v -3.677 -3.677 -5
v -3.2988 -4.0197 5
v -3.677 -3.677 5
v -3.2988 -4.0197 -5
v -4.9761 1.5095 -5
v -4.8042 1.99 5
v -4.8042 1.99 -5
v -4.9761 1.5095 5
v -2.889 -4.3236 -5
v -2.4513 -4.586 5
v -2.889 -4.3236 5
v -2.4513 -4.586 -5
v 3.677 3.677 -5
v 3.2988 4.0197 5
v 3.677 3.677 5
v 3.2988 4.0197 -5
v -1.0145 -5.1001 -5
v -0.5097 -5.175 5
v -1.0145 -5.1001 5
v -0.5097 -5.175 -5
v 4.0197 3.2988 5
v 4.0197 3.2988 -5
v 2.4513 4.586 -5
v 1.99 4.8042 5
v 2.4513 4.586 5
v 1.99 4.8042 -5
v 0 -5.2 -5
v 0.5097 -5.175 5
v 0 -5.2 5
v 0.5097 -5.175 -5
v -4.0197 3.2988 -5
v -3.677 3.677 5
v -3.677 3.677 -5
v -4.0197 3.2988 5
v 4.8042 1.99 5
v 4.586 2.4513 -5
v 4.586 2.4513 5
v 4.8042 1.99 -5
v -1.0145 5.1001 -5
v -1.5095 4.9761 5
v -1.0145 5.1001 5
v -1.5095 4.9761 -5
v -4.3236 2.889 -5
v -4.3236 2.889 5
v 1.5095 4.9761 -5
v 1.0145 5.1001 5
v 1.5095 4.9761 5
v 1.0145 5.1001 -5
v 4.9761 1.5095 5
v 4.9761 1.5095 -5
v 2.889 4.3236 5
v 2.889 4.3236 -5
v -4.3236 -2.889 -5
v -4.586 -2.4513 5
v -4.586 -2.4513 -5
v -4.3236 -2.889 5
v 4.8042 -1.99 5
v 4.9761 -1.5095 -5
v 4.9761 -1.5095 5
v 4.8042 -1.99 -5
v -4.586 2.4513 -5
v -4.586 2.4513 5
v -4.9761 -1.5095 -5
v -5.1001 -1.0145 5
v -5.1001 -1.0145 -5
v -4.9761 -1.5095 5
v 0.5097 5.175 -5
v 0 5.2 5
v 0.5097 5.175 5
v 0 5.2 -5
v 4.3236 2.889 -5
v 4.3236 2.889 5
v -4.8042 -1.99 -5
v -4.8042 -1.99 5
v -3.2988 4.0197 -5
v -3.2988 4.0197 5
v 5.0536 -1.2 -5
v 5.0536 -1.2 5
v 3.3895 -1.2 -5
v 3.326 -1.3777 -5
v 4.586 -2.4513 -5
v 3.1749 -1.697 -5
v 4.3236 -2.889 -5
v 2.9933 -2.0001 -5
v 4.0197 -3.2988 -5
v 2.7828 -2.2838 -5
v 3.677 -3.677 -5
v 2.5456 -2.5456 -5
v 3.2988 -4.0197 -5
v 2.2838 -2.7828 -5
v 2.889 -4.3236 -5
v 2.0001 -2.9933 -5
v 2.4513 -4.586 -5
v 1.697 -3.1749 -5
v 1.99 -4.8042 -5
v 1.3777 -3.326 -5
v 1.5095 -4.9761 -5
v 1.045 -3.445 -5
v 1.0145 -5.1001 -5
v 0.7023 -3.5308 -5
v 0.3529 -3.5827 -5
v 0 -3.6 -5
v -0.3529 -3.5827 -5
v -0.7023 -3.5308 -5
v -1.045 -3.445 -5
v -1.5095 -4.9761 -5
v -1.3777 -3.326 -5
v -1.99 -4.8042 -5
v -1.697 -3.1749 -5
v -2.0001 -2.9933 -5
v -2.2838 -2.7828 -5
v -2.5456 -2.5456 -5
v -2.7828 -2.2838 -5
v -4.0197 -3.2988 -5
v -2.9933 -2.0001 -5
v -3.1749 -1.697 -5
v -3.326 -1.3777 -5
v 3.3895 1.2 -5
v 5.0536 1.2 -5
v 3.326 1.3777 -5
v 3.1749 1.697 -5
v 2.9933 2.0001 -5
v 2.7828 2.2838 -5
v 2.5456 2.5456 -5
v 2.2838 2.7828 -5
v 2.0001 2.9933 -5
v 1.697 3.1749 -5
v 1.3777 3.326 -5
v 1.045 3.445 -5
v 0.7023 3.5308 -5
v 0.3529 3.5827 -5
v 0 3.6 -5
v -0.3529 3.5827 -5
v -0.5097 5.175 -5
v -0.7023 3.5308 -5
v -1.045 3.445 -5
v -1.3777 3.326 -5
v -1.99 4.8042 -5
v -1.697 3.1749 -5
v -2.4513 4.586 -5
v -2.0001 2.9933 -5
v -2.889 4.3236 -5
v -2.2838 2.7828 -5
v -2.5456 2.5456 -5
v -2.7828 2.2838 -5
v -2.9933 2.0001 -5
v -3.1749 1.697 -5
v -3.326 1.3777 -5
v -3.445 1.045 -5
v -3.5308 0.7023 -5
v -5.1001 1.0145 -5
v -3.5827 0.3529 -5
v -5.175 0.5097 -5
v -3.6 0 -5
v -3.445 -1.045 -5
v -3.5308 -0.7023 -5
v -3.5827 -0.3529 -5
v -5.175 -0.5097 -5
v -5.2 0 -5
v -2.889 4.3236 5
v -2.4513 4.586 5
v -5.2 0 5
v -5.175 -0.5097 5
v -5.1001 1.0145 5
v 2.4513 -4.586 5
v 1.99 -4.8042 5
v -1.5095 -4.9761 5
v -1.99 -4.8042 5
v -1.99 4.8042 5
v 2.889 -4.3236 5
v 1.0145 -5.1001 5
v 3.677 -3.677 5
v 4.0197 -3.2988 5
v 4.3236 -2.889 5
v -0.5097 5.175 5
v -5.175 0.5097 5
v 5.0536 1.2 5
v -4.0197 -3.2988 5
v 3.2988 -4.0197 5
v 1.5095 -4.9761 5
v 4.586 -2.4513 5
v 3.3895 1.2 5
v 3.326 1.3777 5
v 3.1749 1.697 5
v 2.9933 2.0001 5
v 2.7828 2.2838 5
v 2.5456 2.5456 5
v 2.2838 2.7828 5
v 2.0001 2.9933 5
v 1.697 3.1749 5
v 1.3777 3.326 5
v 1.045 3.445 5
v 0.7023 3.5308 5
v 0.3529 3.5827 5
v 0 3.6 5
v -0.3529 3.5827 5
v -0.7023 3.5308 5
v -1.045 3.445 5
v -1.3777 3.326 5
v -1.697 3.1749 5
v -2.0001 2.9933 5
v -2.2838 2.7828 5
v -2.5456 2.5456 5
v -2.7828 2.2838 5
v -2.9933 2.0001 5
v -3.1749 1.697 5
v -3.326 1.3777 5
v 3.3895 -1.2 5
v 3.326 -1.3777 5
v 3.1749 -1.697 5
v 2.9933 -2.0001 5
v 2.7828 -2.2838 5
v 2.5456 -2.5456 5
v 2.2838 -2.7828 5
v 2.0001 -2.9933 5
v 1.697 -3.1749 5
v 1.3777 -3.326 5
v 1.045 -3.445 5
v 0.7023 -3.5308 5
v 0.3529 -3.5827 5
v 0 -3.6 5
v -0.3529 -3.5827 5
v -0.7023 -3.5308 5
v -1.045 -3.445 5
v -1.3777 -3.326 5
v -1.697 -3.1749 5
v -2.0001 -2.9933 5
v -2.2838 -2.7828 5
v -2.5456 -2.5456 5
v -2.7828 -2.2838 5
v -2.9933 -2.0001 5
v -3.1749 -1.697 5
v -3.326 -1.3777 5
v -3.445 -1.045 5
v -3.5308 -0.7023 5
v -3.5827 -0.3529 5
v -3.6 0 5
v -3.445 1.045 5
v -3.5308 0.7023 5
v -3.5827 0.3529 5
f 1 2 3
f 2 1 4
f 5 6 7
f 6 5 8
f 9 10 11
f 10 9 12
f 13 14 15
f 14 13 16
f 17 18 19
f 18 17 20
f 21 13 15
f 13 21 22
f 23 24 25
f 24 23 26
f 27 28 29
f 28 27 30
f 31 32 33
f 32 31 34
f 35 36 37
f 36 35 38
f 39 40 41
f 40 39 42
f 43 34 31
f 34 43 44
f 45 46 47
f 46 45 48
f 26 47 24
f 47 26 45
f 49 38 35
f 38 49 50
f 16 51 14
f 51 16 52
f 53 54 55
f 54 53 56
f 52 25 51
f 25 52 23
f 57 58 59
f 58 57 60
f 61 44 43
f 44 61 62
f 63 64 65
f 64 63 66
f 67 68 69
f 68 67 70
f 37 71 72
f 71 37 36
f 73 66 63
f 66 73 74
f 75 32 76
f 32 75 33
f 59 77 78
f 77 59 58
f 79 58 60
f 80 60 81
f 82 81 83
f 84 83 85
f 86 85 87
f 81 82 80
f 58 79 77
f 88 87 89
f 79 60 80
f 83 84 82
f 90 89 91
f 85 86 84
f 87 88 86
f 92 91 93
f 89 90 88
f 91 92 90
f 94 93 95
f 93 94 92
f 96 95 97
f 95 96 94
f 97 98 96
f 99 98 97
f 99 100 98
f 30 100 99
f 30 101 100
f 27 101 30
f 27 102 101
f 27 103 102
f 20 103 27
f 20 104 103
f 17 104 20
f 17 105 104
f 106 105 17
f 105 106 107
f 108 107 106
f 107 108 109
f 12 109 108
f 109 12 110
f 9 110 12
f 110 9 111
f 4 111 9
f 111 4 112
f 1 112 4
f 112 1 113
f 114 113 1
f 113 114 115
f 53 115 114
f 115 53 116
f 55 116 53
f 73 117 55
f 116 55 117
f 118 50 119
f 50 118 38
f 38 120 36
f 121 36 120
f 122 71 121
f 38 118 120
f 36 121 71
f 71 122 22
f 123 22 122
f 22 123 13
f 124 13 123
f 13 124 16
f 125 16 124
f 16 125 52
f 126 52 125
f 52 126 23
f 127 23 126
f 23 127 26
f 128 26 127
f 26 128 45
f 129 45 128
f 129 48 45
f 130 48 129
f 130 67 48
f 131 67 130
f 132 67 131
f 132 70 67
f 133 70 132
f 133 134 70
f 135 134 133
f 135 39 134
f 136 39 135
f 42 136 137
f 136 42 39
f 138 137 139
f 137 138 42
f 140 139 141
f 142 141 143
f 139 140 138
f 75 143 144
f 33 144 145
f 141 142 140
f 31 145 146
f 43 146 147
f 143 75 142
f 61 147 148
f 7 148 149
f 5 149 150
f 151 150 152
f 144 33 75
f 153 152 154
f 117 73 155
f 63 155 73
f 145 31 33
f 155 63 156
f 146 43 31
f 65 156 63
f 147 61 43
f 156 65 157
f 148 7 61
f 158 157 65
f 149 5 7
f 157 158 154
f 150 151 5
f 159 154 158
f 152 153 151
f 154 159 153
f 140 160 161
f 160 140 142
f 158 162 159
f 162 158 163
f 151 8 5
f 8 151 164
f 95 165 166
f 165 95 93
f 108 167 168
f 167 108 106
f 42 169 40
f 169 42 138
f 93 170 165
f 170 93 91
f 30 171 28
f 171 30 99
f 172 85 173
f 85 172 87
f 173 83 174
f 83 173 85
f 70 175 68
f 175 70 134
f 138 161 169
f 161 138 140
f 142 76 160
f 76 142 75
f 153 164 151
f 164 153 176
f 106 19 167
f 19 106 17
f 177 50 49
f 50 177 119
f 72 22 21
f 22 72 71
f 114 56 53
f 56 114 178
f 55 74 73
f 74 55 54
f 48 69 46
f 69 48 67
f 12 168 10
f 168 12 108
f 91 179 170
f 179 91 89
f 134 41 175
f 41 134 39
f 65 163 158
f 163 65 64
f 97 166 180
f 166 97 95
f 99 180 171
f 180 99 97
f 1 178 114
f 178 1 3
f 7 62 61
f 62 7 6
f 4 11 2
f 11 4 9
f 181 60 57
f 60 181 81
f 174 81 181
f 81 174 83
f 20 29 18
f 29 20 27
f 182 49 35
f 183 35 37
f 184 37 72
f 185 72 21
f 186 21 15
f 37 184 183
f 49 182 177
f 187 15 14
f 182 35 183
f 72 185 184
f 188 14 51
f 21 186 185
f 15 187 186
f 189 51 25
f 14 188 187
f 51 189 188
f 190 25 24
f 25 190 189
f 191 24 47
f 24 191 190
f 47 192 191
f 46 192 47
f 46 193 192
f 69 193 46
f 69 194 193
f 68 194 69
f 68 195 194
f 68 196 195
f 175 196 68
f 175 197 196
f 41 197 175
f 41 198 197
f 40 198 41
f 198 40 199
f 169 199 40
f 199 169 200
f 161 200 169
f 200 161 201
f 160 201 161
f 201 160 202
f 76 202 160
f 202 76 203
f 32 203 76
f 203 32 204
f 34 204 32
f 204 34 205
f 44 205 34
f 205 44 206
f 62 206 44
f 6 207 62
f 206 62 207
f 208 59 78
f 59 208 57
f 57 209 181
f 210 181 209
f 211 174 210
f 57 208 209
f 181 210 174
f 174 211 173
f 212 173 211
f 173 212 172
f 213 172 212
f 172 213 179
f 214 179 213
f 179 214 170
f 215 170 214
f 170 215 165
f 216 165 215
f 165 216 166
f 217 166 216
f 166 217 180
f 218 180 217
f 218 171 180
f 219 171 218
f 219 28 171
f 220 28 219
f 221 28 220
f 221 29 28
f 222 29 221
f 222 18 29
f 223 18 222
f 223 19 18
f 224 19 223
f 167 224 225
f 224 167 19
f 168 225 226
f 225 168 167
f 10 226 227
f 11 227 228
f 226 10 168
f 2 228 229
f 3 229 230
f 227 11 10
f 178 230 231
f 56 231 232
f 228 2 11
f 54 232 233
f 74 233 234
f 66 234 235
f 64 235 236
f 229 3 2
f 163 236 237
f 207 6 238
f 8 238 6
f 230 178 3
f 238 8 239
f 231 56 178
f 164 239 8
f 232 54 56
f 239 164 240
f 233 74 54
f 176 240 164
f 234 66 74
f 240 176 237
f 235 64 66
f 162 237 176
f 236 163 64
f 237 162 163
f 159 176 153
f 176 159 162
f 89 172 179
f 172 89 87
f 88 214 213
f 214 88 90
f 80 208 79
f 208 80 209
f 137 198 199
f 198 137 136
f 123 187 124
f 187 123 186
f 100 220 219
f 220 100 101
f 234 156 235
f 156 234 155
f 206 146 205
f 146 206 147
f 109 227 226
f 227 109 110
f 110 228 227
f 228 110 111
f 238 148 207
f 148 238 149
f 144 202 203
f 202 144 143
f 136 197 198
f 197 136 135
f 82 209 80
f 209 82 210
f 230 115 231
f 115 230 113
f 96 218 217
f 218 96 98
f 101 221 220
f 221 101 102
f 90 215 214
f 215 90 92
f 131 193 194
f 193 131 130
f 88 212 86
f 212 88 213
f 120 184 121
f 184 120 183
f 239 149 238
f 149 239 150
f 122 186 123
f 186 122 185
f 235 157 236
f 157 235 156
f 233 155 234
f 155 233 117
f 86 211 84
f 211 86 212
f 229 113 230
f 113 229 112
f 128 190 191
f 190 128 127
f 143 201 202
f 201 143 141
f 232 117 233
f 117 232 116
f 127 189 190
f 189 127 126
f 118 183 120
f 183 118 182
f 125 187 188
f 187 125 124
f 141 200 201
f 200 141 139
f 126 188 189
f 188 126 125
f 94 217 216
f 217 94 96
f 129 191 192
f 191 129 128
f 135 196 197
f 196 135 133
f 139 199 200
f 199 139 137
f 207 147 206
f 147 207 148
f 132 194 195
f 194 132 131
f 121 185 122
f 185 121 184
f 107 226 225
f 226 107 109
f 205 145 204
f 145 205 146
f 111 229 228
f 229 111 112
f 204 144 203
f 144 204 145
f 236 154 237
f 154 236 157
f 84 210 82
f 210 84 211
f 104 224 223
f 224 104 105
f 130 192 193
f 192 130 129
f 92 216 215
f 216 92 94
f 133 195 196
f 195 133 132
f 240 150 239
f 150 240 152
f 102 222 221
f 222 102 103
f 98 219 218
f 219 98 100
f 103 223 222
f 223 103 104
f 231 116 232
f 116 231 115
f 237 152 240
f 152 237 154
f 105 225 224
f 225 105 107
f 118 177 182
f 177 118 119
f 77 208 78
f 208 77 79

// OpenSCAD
//cylinder(h = height, r1 = BottomRadius, r2 = TopRadius, center = true/false);

weight=3.2;
innerD=7.2;
height=10;


gapWidth=2.4;
//cube(size = [x,y,z], center = true/false);


res = 64;

difference() {
    cylinder(h = height, d = innerD+weight, center = true, $fn=res);  
    cylinder(h = height, d = innerD, center = true, $fn=res);  
    
    translate([0,-gapWidth/2,-height/2]) cube(size = [20,gapWidth,height], center = false);
}
